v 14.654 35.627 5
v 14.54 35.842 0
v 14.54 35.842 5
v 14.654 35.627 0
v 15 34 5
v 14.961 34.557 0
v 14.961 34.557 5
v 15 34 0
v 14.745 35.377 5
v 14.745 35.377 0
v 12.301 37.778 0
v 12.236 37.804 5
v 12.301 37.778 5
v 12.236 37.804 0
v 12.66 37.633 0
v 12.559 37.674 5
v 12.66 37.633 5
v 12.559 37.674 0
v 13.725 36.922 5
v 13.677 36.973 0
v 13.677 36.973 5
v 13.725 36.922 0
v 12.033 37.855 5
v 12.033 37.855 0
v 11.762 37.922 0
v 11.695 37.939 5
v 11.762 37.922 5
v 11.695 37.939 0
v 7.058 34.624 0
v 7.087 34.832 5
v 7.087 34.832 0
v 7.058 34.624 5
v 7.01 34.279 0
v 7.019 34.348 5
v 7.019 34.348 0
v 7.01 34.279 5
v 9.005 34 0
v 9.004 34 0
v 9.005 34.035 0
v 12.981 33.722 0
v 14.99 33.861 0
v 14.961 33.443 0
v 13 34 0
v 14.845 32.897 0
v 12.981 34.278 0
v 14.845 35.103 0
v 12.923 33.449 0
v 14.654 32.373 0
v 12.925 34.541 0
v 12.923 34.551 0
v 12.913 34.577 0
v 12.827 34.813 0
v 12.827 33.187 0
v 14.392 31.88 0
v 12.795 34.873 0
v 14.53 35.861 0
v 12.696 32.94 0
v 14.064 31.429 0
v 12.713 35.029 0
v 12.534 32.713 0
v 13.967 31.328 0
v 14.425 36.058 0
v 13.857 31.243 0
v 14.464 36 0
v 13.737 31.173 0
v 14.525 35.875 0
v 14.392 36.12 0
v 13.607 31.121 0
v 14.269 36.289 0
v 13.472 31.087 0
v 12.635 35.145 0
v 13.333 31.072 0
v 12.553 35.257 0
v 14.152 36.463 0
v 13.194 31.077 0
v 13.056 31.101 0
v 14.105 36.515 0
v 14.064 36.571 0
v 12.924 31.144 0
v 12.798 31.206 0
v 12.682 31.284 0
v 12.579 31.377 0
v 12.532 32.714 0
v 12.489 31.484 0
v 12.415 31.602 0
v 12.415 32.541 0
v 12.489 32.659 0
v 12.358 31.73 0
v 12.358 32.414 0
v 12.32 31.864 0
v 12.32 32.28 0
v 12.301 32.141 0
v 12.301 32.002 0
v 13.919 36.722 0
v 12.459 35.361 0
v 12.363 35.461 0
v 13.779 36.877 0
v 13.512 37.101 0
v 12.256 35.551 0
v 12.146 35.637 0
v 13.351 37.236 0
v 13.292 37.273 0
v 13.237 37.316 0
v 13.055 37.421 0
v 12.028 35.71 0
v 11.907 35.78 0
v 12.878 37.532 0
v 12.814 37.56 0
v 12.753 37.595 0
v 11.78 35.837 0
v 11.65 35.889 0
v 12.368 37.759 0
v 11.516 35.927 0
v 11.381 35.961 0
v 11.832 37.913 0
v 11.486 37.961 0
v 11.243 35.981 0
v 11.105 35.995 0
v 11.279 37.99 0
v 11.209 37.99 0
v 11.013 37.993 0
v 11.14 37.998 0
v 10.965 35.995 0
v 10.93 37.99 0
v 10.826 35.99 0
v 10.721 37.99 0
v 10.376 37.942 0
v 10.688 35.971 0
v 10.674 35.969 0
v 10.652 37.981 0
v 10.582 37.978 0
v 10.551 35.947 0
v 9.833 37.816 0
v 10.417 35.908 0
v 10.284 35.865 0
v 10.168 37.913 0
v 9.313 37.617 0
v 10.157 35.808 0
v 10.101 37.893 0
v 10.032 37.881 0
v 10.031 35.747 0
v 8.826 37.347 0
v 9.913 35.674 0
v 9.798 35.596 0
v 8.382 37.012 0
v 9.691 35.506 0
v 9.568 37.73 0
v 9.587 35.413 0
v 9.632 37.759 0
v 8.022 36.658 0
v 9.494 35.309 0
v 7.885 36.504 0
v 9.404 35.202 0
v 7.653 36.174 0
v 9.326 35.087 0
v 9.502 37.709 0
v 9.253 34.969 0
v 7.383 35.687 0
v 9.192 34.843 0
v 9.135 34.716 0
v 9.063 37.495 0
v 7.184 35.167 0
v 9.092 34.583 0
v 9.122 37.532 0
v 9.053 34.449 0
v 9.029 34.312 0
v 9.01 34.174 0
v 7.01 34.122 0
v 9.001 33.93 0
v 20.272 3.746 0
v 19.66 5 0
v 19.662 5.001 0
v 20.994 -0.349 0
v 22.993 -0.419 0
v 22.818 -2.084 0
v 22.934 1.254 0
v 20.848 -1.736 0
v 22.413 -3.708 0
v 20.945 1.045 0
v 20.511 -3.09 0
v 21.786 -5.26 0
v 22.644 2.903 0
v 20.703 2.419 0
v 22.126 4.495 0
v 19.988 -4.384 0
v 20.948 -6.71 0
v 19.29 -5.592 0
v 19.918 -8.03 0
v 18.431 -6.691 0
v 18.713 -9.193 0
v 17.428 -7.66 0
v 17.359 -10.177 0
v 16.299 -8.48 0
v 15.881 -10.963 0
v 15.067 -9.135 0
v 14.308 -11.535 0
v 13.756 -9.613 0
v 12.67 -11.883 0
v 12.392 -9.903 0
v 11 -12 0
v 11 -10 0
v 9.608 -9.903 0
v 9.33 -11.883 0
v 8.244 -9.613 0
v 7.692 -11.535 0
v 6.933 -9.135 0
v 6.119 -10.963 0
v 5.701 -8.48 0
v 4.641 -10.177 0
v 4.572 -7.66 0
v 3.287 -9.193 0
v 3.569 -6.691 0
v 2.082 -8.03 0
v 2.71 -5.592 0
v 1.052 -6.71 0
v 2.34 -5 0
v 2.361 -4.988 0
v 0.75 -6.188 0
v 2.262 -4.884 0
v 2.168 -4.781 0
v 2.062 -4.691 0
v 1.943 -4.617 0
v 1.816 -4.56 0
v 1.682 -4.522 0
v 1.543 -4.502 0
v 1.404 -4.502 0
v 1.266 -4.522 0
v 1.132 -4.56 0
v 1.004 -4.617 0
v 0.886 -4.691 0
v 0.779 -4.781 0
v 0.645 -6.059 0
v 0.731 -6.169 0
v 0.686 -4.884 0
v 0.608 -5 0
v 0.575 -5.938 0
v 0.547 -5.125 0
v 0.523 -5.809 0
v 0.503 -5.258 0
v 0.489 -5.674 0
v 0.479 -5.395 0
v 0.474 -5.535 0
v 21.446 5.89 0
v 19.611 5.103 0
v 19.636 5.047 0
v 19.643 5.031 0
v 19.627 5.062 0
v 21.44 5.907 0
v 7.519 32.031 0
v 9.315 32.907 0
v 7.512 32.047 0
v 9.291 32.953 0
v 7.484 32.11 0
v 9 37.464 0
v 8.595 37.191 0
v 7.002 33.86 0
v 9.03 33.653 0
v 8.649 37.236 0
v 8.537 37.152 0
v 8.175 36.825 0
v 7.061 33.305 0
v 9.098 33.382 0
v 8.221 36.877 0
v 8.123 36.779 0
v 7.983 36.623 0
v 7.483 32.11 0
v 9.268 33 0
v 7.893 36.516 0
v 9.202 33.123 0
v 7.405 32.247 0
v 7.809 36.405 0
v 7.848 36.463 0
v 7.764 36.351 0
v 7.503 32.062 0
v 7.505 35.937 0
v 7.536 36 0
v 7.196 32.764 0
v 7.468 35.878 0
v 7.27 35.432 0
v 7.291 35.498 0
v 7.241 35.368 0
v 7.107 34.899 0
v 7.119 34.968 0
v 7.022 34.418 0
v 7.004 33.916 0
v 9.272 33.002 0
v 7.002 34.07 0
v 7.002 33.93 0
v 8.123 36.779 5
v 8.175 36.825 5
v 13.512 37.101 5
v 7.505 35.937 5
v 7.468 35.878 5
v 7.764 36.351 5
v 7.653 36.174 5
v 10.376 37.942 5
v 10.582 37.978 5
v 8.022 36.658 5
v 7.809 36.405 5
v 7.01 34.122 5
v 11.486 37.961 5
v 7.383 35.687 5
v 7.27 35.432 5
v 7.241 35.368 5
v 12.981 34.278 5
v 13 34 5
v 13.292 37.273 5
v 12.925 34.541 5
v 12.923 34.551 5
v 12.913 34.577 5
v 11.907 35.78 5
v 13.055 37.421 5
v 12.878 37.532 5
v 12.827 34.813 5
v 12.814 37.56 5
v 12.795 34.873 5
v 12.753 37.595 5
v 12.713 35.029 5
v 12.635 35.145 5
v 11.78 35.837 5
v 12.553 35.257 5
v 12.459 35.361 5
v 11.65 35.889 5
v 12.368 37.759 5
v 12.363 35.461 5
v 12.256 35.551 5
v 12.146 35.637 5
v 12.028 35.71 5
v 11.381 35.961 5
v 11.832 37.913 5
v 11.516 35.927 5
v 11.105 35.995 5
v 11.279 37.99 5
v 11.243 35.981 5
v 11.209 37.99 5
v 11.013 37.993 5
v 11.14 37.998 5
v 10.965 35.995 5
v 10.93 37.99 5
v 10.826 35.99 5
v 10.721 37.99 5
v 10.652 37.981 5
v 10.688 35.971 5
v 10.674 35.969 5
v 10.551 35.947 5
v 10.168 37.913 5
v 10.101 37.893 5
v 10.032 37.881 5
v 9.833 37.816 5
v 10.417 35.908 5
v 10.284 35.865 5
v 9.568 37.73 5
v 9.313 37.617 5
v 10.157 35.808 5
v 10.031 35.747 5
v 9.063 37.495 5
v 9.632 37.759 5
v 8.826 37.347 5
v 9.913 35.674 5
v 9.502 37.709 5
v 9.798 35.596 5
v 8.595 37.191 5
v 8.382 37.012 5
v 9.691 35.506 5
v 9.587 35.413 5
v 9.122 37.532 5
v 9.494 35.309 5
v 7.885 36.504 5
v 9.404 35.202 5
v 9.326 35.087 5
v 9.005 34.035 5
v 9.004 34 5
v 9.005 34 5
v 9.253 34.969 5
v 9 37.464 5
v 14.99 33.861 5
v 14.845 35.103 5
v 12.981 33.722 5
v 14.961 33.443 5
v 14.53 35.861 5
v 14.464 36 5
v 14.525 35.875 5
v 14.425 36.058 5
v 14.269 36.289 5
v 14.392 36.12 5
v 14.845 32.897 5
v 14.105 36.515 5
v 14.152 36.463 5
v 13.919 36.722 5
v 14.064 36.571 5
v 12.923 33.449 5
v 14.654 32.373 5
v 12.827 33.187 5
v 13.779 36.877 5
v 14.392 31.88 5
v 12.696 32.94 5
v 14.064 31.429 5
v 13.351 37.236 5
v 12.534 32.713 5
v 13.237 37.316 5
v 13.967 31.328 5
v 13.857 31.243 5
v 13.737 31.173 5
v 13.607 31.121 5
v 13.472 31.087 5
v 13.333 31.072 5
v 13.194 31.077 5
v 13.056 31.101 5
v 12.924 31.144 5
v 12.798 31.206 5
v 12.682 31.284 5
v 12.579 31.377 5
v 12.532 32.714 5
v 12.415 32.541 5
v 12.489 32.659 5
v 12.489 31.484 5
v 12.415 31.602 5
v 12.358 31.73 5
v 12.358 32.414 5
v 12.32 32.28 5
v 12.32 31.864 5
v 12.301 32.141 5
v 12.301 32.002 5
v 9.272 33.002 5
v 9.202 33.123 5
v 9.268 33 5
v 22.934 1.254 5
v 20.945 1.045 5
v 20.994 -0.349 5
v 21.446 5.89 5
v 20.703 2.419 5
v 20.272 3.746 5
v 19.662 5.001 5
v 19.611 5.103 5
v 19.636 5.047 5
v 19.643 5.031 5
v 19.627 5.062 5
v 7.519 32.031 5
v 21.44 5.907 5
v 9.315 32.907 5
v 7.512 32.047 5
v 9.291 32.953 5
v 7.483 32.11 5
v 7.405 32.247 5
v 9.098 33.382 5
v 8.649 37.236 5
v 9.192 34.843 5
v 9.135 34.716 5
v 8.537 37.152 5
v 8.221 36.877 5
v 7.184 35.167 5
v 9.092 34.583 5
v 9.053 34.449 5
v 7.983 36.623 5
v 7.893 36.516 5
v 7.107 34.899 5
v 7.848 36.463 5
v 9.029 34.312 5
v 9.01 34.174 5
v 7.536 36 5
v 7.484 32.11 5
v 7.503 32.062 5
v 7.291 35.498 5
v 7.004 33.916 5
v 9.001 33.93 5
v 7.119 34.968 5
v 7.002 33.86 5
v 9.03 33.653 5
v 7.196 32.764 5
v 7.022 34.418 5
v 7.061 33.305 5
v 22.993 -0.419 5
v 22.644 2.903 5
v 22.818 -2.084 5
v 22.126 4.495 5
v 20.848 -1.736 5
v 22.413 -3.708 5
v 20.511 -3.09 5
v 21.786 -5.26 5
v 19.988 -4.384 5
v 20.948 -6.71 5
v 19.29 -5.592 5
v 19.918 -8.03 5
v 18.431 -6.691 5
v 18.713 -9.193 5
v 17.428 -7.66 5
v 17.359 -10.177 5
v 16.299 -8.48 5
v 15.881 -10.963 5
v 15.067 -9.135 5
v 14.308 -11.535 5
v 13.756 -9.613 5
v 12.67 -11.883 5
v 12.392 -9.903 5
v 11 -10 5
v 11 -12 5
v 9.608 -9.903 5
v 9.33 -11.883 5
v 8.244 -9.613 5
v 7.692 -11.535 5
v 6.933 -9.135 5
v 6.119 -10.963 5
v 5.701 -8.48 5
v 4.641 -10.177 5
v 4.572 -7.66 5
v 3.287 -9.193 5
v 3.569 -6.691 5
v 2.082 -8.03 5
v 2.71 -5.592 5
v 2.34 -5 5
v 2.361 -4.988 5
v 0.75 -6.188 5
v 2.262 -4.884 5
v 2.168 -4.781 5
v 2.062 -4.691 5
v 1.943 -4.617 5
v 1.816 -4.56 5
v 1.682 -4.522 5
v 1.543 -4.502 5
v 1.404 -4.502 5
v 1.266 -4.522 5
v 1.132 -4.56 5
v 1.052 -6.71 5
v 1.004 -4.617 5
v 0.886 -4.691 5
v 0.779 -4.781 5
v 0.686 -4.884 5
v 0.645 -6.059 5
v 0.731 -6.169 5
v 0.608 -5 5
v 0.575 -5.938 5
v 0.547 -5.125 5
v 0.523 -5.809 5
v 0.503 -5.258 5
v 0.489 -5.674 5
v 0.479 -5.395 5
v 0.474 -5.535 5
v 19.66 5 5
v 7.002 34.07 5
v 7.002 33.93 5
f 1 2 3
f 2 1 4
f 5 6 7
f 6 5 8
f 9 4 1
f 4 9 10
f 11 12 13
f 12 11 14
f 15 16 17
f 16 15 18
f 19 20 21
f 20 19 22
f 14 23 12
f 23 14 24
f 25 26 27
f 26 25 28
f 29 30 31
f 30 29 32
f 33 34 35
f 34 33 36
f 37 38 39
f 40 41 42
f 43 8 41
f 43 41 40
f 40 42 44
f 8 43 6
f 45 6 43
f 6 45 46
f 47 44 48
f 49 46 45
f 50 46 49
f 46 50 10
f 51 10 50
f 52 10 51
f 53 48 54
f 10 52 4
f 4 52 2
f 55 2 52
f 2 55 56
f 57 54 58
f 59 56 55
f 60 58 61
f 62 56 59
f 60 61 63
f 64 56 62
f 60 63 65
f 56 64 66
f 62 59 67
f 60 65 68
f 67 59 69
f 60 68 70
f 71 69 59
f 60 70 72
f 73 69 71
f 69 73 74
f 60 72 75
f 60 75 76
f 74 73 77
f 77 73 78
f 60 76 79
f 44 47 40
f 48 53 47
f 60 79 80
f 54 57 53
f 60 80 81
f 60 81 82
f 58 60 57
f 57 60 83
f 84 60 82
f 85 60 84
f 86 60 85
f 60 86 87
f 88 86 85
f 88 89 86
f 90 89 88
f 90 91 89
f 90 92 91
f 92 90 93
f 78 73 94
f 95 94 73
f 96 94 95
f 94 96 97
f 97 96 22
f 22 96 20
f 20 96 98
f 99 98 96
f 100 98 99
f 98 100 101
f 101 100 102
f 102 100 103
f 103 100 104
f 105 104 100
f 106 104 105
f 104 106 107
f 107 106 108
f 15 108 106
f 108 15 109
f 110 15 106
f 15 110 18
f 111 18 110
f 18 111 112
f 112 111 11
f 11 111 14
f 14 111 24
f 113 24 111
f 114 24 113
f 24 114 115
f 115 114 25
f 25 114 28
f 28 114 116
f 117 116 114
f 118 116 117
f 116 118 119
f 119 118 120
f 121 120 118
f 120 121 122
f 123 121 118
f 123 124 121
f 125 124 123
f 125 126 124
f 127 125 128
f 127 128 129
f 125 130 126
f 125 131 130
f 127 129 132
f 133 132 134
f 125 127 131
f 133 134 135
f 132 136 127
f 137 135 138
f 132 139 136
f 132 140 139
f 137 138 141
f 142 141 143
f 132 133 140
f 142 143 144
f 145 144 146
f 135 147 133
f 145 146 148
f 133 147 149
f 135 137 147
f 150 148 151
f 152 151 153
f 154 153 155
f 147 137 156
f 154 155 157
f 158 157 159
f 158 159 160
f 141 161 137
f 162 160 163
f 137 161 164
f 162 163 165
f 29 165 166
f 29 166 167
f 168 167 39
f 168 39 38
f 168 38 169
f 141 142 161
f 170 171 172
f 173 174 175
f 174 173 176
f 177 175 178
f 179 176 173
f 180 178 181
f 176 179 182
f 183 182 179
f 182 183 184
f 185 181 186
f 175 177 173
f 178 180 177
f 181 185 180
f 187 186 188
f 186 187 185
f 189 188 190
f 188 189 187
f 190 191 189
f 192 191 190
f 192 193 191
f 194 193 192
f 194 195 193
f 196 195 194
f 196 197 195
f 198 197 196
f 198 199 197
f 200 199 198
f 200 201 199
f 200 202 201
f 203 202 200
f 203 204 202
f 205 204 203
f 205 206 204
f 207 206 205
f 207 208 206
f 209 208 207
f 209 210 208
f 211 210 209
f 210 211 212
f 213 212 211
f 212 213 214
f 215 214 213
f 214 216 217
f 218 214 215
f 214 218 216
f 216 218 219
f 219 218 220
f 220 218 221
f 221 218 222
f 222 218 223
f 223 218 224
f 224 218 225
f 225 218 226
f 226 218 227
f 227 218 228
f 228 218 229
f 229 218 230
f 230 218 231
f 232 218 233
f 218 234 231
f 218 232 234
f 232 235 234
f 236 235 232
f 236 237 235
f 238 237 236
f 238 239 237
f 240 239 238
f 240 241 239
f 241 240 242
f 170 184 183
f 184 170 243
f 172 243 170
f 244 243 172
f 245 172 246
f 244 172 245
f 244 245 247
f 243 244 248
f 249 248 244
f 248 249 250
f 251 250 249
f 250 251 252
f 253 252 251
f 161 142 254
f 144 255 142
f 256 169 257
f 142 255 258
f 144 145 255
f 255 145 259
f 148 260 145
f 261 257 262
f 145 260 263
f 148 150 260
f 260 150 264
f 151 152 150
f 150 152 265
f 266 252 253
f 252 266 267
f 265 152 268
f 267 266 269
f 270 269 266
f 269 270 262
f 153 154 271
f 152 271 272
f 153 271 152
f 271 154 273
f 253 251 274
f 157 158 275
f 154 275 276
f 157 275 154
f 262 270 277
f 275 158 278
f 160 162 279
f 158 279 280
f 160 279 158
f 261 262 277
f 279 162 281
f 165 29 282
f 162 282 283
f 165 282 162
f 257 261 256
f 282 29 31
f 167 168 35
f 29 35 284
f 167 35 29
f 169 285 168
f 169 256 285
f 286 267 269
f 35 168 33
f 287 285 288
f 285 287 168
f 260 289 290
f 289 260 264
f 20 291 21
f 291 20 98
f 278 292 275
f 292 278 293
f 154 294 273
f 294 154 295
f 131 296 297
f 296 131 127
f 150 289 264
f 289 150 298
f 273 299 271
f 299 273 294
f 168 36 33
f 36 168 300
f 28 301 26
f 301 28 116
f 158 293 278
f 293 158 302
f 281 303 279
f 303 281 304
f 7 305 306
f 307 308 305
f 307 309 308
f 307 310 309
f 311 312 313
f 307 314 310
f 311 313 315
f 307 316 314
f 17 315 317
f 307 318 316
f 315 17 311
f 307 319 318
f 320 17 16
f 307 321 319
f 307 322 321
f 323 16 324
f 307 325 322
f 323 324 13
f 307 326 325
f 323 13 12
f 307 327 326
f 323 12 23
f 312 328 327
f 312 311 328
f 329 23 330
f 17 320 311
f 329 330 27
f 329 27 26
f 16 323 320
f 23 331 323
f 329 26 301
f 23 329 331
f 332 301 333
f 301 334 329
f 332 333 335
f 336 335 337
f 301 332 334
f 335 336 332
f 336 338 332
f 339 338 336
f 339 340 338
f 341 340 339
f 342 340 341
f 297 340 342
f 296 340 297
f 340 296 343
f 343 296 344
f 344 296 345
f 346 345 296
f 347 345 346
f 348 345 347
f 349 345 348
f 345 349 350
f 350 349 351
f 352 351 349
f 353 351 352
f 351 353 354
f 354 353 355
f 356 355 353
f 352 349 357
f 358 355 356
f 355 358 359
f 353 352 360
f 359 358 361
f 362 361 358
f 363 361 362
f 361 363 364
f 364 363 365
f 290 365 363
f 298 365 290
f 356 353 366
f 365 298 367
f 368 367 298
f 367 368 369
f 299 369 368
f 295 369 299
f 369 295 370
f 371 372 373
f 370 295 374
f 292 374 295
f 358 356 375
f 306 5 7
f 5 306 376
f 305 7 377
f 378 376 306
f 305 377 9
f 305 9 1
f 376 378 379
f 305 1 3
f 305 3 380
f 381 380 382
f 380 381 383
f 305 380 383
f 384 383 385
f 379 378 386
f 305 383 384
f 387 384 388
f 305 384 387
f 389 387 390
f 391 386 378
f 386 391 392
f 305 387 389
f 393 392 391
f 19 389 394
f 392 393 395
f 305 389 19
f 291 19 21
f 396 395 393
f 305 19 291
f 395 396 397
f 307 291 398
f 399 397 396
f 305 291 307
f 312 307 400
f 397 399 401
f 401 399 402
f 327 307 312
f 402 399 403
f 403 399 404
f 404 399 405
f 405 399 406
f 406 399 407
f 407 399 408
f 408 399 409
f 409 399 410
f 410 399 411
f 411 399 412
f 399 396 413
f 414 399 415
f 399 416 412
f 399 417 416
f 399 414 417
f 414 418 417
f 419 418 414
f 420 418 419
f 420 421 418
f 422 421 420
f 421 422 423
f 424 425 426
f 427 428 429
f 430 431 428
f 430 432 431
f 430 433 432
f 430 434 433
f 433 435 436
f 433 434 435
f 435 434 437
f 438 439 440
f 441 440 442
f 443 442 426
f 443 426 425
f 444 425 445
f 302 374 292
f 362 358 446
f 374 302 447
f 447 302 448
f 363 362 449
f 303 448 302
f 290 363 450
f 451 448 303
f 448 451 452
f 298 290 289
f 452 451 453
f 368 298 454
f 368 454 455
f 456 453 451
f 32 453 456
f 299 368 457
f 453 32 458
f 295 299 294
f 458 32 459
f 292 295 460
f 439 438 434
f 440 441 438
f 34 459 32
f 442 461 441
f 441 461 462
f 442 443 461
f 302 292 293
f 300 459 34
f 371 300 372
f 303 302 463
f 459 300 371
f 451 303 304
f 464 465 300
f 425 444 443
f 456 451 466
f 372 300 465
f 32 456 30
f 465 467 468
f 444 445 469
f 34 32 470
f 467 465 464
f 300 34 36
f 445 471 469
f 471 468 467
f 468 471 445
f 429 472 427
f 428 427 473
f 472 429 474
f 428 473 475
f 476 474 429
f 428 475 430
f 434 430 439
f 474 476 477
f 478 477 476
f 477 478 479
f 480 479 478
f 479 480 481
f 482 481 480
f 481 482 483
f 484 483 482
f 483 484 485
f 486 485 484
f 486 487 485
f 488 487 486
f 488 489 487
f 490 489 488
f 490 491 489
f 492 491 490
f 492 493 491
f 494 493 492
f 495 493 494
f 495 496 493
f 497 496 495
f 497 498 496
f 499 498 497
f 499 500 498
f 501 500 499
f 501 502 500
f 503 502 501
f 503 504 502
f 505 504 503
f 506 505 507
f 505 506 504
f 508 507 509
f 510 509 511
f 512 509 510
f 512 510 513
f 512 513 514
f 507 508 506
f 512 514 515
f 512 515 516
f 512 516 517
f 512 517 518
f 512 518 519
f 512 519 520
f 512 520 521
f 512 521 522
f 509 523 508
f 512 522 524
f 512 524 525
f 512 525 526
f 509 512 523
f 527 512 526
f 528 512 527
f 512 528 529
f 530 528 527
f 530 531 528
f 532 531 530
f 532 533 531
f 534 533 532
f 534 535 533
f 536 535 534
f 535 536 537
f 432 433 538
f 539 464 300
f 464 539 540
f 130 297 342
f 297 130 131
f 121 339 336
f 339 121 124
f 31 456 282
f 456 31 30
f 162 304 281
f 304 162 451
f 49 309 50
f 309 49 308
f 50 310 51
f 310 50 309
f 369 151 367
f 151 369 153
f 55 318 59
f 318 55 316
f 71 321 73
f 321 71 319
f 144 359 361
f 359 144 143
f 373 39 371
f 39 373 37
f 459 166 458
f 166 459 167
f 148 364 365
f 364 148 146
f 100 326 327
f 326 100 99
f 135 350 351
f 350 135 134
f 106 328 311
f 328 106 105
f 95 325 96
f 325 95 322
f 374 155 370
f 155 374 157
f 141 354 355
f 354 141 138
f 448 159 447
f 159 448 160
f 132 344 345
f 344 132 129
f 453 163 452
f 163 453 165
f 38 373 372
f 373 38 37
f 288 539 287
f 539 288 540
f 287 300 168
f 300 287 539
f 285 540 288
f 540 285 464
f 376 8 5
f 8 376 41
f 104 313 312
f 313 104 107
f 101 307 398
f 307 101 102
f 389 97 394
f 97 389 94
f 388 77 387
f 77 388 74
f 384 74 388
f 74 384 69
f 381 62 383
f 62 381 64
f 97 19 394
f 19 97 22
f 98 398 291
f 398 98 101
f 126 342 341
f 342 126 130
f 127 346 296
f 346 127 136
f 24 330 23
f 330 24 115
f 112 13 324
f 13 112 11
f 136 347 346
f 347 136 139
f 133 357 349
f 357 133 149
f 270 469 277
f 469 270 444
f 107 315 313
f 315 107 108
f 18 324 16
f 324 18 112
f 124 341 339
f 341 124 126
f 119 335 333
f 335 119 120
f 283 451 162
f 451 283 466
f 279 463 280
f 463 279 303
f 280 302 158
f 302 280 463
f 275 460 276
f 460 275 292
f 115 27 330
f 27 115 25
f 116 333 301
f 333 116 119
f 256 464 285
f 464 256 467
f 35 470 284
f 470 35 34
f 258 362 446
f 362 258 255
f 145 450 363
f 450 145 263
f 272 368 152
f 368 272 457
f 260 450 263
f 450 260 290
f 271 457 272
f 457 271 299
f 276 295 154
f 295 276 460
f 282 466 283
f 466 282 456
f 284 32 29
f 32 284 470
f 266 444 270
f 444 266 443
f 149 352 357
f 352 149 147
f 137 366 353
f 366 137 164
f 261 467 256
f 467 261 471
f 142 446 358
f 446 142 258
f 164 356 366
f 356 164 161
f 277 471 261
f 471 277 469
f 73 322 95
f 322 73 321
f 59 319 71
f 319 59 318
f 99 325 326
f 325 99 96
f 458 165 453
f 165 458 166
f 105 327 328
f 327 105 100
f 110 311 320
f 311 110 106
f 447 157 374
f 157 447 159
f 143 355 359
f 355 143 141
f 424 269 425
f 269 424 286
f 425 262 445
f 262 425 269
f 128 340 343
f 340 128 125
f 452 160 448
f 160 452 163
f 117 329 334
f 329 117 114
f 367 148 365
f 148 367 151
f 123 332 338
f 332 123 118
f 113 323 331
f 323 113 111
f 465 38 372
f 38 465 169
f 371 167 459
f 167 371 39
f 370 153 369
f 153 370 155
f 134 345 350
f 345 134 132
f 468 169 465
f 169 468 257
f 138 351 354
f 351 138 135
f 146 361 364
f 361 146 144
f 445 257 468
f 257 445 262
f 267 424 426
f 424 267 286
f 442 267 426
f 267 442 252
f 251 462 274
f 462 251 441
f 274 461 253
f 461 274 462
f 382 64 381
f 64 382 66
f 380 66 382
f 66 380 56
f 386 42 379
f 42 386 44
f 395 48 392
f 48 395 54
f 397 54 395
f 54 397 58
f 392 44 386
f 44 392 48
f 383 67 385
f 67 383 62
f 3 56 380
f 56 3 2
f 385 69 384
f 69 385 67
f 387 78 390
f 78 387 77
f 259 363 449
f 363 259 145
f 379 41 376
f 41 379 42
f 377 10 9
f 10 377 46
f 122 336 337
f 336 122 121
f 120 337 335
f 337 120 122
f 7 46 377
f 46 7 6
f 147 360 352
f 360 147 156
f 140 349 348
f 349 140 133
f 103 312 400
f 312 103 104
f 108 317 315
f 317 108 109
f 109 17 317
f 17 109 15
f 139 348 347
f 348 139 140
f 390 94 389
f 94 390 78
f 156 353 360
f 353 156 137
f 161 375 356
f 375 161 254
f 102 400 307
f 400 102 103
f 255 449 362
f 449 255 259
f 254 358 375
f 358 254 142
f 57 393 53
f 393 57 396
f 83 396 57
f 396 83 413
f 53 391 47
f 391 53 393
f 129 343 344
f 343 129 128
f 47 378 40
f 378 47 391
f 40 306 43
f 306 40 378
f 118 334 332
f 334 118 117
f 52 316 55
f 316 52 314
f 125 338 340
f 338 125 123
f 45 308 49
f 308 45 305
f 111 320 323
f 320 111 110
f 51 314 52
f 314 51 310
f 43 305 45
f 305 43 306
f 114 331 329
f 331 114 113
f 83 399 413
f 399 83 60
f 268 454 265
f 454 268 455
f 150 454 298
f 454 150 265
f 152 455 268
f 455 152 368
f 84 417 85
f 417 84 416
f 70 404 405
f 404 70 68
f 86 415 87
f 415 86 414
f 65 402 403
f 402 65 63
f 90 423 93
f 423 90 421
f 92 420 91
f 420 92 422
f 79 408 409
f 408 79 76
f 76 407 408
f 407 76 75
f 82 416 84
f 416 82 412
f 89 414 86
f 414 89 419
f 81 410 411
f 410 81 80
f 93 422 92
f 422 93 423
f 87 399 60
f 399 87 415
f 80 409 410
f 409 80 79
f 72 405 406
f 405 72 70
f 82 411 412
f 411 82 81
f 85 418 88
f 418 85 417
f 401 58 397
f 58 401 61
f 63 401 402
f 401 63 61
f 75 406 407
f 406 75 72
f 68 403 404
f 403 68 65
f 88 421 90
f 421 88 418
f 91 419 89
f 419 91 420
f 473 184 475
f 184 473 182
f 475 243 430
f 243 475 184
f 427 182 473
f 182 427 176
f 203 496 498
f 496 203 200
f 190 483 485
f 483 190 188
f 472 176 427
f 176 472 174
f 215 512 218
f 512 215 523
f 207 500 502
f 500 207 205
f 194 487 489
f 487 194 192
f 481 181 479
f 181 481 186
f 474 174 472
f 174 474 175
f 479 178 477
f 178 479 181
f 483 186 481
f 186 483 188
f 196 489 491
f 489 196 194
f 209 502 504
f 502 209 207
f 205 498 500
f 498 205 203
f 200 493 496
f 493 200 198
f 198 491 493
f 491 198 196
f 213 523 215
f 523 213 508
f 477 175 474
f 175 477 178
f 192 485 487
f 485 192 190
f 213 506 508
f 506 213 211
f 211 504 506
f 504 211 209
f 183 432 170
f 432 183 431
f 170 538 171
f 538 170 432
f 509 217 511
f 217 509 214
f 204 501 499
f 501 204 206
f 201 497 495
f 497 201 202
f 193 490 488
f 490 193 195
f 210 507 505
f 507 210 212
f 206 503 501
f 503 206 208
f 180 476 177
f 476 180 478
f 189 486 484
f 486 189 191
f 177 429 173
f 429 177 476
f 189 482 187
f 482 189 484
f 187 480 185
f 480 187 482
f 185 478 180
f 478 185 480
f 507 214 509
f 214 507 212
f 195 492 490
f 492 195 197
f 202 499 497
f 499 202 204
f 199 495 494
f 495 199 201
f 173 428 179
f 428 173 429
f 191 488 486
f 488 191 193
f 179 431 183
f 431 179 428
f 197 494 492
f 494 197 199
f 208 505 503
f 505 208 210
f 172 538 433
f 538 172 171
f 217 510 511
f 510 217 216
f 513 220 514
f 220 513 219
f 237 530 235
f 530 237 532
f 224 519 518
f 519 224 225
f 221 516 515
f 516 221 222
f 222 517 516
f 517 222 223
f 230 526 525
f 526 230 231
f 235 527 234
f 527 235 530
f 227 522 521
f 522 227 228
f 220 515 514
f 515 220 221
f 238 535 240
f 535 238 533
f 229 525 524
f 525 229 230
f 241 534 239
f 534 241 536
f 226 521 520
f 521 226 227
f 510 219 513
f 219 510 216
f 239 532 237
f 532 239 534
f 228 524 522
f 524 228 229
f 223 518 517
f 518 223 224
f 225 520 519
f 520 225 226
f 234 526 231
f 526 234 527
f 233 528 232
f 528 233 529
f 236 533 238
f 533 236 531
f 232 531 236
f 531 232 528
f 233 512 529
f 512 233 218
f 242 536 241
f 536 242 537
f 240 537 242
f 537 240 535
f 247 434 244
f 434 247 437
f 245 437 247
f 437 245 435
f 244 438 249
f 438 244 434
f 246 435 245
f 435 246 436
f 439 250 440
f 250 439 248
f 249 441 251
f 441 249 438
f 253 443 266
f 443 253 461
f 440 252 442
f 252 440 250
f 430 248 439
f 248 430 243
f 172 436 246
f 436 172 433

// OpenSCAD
module hook() {
    THICKNESS = 2;
    HEIGHT = 5;
    LENGTH = 50;
    BOTTOM_RADIUS = 10;
    TOP_RADIUS = 2;
    FRAGMENTS = 45;
    BOTTOM_ANGLE = 30;

    arm_length = LENGTH - TOP_RADIUS - BOTTOM_RADIUS - 2*THICKNESS;
    top_shift = [BOTTOM_RADIUS+THICKNESS/2, arm_length, 0];
    bottom_shift = [BOTTOM_RADIUS+THICKNESS/2, 0, 0];
    top();
    bottom();
    arm();

    module curve(radius) {
        difference() {
            cylinder(h=HEIGHT, r=radius+THICKNESS, $fn=FRAGMENTS);
            cylinder(h=HEIGHT, r=radius, $fn=FRAGMENTS);
            translate([-radius-THICKNESS, -radius-THICKNESS, 0]) cube([2 * (radius+THICKNESS), radius+THICKNESS, HEIGHT]);
        }
        translate([-radius-THICKNESS/2, 0, 0]) cylinder(h=HEIGHT, r=THICKNESS/2, $fn=FRAGMENTS);
        translate([radius+THICKNESS/2, 0, 0]) cylinder(h=HEIGHT, r=THICKNESS/2, $fn=FRAGMENTS);
    }

    module top() {
        translate(top_shift) curve(TOP_RADIUS);
        translate(top_shift) rotate([0, 0, BOTTOM_ANGLE]) curve(TOP_RADIUS);
        translate(top_shift) rotate([0, 0, -BOTTOM_ANGLE-10]) curve(TOP_RADIUS);
    }
        

    module bottom() {
        translate(bottom_shift + [0, 0, HEIGHT]) rotate([180, 0, BOTTOM_ANGLE]) curve(BOTTOM_RADIUS);
    }

    module arm() {
        // Positions for the endpoints of the arm
        arm_start = top_shift + [
            (-TOP_RADIUS - THICKNESS / 2) * cos(BOTTOM_ANGLE),
            (-TOP_RADIUS - THICKNESS / 2) * sin(BOTTOM_ANGLE),
            0
        ];
        arm_end = bottom_shift + [
            (BOTTOM_RADIUS + THICKNESS / 2) * cos(BOTTOM_ANGLE),
            (BOTTOM_RADIUS + THICKNESS / 2) * sin(BOTTOM_ANGLE),
            0
        ];


        // Create a connecting arm using a hull between cylinders
        hull() {
            translate(arm_start)
                cylinder(h=HEIGHT, r=THICKNESS / 2, $fn=FRAGMENTS);
            translate(arm_end)
                cylinder(h=HEIGHT, r=THICKNESS / 2, $fn=FRAGMENTS);
        }
    }
}

hook();
